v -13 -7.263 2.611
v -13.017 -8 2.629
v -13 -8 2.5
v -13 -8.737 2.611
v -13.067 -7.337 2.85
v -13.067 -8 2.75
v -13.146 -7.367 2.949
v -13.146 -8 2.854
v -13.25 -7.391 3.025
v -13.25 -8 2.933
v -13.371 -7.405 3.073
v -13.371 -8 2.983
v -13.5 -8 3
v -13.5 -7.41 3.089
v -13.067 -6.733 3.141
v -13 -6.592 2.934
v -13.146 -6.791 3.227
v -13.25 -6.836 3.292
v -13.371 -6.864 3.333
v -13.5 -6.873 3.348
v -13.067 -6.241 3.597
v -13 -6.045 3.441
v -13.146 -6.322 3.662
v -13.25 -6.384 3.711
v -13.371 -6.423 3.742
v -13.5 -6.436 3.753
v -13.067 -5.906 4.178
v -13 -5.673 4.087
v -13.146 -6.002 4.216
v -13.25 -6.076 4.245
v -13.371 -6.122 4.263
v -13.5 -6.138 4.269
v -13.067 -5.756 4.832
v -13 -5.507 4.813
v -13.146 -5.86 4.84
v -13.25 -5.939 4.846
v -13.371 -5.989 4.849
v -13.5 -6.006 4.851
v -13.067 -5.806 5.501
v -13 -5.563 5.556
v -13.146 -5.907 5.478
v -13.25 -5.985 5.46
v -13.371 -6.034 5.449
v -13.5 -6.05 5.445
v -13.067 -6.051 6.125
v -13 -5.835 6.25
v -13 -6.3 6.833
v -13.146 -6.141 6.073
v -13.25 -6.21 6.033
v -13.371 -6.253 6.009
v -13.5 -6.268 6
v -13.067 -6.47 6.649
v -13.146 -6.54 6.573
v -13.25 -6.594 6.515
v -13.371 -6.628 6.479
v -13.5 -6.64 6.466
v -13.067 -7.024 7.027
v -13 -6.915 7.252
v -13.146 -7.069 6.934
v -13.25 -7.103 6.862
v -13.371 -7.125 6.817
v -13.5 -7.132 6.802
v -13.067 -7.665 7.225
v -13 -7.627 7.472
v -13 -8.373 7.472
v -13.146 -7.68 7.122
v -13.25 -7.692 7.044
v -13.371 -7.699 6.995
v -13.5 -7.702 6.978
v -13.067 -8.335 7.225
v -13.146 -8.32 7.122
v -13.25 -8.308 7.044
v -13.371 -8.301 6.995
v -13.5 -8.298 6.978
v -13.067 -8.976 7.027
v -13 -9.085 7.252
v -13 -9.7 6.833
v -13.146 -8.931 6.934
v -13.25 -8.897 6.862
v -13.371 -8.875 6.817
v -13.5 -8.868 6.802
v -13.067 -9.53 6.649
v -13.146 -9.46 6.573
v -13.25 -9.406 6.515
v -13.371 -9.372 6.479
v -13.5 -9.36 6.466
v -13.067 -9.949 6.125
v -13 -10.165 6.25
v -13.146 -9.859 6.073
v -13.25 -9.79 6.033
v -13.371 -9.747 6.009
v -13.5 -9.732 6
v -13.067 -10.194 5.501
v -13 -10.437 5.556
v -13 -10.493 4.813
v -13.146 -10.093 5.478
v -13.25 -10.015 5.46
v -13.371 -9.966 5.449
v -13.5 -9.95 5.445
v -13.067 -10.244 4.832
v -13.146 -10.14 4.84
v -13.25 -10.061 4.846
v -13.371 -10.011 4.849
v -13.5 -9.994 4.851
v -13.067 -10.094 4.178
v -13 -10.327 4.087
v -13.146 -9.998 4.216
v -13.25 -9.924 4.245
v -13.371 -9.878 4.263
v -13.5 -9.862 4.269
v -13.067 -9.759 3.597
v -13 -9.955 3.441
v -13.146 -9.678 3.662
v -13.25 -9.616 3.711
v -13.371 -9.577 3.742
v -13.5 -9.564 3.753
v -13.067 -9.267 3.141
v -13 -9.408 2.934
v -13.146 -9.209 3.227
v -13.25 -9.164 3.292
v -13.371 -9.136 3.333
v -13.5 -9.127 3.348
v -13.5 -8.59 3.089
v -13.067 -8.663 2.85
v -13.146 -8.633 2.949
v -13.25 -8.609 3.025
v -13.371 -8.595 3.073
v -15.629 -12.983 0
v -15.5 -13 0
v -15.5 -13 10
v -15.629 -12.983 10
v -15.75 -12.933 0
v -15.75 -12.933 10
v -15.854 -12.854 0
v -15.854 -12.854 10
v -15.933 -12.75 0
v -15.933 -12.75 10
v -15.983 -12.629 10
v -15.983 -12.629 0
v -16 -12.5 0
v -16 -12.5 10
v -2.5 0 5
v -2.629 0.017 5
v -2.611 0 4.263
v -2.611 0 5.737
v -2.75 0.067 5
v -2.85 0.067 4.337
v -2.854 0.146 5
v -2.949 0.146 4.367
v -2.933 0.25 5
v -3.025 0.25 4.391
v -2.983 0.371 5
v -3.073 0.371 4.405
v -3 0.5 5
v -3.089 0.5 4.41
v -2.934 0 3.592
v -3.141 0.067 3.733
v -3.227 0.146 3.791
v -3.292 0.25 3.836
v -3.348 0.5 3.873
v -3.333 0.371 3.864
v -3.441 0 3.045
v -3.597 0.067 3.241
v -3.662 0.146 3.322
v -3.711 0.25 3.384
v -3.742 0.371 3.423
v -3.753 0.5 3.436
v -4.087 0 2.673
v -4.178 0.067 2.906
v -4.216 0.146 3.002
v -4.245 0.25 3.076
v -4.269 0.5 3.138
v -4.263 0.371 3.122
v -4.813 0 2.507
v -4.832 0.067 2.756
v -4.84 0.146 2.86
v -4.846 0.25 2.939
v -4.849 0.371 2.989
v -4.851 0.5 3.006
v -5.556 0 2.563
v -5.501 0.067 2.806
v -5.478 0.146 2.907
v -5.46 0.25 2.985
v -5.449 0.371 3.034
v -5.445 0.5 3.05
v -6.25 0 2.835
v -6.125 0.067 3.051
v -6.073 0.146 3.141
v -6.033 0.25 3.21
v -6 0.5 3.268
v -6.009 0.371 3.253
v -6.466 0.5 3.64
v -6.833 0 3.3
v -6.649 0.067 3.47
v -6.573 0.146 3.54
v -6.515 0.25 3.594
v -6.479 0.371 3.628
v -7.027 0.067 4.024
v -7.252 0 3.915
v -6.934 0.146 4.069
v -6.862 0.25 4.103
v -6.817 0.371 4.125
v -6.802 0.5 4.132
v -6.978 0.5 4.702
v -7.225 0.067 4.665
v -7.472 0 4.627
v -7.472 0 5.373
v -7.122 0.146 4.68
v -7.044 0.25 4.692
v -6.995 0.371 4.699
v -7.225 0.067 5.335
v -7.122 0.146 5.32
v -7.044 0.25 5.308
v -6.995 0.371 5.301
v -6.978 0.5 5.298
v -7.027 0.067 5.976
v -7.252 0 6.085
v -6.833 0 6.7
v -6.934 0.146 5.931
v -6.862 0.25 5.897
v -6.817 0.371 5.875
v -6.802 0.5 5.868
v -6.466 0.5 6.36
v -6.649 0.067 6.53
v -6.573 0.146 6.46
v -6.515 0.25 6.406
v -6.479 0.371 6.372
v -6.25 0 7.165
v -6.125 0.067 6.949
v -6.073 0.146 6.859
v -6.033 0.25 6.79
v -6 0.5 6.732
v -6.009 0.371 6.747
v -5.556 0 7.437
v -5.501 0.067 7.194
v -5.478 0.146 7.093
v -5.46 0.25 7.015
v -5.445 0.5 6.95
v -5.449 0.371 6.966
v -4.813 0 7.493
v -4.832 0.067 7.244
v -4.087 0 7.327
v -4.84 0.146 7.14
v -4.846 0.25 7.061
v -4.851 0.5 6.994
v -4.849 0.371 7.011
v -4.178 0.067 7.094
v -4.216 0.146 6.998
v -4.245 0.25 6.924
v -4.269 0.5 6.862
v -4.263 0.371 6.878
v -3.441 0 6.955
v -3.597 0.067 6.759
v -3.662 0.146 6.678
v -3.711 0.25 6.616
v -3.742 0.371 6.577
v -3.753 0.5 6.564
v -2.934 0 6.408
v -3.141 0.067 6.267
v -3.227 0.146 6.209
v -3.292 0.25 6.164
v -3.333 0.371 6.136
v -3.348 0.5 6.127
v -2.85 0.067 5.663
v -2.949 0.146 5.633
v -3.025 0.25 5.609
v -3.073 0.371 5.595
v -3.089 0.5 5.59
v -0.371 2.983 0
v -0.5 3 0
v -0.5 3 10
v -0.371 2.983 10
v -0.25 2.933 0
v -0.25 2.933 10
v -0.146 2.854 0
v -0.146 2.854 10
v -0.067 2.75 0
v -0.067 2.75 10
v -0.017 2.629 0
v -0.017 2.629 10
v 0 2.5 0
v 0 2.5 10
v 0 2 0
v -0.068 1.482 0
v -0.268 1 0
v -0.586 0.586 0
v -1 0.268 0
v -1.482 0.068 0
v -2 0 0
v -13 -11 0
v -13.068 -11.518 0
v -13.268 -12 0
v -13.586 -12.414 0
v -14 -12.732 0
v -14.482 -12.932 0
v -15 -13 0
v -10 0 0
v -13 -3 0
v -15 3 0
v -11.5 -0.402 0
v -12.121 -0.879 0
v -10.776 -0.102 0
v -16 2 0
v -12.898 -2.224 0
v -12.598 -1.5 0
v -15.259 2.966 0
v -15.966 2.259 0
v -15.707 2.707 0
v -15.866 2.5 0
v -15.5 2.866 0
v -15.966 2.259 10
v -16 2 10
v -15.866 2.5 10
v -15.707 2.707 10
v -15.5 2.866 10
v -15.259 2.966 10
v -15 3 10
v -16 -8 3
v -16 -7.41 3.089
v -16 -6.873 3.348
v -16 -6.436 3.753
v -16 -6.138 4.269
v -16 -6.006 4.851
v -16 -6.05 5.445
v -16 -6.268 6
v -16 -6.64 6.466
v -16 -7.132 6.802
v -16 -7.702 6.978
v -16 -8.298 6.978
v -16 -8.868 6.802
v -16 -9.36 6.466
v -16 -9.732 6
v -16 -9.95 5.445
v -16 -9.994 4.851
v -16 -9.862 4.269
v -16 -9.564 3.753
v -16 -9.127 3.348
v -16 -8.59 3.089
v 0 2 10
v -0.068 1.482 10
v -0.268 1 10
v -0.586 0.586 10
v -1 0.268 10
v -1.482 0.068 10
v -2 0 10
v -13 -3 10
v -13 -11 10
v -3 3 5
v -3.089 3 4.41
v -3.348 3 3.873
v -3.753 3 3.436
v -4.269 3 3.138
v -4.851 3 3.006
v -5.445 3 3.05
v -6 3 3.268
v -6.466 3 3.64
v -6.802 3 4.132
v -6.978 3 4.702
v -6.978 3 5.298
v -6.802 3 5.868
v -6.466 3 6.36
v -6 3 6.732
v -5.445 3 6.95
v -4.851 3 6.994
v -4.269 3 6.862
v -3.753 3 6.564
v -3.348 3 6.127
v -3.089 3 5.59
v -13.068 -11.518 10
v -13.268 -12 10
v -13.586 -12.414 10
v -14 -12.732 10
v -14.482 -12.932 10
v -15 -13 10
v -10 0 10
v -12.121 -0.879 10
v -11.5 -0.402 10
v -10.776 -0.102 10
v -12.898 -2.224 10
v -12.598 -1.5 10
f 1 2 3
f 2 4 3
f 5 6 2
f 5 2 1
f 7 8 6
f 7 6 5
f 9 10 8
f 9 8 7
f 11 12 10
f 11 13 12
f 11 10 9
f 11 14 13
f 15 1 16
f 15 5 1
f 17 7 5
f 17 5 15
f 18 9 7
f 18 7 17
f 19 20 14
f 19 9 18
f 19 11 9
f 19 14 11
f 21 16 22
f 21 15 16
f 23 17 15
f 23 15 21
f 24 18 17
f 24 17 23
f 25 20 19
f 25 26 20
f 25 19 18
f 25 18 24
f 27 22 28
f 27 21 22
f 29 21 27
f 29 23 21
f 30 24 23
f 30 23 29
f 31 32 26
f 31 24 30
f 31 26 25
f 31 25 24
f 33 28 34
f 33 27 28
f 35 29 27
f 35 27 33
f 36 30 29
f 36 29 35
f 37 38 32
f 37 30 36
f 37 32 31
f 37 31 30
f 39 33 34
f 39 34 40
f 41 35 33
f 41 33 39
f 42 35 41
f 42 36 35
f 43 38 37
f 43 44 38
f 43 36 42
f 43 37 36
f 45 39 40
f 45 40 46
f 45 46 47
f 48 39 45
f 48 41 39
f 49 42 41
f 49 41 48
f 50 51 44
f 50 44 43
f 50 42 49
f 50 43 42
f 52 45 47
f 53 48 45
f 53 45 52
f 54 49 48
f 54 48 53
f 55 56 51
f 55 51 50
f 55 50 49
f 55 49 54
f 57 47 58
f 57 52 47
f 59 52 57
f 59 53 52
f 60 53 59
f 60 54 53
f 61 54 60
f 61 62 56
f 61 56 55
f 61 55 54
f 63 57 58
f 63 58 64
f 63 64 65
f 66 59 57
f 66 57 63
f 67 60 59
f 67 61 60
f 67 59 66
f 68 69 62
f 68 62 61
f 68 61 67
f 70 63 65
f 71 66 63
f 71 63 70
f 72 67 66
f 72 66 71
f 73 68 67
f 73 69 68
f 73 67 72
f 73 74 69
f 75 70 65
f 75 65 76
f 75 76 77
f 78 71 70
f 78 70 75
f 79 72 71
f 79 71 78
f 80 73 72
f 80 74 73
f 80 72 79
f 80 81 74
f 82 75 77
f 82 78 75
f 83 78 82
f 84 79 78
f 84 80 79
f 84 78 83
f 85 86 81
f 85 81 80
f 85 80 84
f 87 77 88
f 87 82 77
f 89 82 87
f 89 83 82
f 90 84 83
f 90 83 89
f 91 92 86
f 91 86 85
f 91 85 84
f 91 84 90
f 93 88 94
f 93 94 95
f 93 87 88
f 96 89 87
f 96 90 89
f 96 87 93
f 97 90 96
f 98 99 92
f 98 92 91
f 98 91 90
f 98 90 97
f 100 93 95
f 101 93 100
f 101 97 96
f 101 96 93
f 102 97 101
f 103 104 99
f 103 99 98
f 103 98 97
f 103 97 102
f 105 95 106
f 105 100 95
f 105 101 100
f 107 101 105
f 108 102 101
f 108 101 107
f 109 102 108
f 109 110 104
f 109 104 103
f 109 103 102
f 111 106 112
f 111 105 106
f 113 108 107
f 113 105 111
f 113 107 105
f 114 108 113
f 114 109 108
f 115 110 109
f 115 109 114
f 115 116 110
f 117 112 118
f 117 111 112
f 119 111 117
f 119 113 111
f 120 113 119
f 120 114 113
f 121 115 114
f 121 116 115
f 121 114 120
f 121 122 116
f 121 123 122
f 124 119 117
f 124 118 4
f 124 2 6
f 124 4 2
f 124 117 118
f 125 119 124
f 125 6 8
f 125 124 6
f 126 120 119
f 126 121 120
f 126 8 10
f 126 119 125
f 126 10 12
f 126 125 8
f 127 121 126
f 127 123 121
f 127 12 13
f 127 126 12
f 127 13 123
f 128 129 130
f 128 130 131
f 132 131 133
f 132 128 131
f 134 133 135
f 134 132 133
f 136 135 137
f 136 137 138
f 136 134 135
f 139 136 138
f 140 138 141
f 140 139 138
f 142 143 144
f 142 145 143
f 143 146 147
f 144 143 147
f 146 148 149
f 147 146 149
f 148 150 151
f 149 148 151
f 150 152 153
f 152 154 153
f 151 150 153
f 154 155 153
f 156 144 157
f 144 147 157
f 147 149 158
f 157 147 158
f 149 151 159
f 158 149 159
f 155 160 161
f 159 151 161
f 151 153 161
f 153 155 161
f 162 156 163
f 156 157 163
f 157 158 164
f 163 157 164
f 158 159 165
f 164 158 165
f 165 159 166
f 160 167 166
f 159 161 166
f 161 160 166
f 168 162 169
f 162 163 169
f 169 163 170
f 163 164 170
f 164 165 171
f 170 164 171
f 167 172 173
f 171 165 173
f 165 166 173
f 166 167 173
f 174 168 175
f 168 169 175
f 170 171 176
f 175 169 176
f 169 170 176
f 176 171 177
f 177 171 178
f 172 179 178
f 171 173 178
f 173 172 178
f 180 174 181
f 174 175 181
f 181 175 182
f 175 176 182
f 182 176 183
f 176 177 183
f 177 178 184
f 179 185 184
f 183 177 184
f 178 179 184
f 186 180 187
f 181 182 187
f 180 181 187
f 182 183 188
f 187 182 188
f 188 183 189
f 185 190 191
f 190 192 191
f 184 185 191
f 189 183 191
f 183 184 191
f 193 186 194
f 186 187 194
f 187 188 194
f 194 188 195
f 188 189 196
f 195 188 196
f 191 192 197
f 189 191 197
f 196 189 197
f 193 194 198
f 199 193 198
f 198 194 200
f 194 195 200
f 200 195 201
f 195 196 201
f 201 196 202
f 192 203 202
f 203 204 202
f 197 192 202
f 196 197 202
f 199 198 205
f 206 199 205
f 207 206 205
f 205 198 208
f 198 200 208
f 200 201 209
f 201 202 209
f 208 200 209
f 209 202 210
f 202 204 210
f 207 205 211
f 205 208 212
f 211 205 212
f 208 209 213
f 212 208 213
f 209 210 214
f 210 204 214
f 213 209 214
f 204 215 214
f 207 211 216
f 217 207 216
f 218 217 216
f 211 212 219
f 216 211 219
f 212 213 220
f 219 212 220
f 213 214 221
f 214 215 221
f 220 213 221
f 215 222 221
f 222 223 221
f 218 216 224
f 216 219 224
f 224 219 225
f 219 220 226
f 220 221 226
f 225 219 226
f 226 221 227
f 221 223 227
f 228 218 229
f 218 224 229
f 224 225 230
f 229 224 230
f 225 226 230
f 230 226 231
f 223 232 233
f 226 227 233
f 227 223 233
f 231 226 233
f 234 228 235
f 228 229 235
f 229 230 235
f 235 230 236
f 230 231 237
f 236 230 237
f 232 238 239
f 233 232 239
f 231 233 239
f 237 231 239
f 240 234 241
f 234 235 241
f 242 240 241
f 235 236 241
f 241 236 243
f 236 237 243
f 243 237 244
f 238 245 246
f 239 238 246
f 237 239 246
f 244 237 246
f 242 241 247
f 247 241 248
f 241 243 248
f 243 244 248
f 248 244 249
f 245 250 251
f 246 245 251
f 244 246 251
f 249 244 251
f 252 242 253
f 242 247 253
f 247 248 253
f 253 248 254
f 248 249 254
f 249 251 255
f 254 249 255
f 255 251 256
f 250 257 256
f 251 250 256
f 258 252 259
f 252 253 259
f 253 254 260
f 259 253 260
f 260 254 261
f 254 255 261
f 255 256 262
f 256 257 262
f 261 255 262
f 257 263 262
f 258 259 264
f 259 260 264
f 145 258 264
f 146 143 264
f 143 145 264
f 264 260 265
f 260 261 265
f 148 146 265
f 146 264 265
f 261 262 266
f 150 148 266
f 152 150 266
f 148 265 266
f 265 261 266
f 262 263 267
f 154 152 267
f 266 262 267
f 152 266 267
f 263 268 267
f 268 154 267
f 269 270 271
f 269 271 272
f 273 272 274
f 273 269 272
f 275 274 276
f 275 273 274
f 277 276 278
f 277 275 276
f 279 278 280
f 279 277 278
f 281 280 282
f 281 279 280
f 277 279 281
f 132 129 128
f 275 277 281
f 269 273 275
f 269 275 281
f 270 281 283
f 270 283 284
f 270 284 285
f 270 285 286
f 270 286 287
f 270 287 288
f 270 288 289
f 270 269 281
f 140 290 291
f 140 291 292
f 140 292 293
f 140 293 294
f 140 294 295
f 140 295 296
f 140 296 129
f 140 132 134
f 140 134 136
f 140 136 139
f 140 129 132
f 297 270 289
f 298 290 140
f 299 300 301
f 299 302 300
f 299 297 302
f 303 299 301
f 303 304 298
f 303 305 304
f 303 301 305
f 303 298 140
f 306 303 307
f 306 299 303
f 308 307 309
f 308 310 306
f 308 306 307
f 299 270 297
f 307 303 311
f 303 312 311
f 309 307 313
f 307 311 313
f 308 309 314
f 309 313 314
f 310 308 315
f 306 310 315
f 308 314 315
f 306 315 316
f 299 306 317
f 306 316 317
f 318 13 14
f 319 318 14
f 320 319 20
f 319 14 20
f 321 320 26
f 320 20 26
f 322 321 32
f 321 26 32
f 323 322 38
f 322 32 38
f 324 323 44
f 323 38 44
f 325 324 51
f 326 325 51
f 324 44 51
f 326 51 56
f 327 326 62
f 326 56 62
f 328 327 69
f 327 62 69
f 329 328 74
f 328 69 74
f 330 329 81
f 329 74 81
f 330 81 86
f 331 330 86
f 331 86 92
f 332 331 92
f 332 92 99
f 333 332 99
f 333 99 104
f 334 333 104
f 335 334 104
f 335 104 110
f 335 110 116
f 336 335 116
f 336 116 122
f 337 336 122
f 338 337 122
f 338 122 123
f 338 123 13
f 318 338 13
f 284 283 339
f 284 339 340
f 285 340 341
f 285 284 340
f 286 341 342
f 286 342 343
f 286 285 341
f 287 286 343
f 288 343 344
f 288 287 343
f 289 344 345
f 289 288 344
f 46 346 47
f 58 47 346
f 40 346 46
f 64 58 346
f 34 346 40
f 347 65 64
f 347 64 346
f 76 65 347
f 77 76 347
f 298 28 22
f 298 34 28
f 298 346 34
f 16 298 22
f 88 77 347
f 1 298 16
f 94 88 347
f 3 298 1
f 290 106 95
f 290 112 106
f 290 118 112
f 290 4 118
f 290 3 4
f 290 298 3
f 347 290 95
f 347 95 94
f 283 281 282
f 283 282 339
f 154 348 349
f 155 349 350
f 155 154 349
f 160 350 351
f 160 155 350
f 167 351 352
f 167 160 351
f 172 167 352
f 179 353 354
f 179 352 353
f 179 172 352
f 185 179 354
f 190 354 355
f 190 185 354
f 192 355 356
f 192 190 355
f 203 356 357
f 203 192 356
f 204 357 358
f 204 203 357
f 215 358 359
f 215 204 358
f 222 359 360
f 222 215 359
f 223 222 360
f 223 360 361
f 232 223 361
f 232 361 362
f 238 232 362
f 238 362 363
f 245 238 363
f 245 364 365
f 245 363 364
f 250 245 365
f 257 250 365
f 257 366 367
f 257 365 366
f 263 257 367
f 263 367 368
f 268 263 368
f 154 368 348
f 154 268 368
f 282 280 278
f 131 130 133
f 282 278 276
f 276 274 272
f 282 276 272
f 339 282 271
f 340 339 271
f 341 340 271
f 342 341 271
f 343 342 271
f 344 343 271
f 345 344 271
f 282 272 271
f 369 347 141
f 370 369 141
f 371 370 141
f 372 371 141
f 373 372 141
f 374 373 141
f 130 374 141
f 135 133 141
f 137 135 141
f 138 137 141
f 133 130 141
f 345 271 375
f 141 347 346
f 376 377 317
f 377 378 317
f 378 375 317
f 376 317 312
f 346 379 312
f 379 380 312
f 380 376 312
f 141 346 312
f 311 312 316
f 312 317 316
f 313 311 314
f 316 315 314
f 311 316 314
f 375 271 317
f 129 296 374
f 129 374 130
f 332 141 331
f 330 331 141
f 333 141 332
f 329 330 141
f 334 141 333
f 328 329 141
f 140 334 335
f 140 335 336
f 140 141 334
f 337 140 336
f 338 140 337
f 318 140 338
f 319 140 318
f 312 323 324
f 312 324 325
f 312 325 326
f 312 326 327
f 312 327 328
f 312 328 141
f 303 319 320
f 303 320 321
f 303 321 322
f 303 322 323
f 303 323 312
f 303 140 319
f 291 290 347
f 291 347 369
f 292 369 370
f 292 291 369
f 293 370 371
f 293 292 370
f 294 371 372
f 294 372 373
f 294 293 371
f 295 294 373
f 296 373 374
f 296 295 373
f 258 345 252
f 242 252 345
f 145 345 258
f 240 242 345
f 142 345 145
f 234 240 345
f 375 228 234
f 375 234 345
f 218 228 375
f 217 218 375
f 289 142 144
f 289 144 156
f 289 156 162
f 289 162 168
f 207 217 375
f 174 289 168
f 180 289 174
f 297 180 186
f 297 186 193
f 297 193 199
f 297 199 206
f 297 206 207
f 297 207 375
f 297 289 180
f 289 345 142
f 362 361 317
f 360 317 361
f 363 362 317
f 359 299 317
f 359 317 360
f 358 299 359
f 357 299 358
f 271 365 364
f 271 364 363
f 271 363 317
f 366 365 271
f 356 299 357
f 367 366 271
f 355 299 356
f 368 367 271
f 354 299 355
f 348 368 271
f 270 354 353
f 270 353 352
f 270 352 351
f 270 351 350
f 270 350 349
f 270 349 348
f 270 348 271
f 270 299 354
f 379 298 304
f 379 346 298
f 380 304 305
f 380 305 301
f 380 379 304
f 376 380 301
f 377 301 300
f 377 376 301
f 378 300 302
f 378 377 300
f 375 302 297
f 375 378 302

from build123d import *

# Parameters (mm, degrees)
EXTRUDE_1_DEPTH     = 10
SKETCH_4_R          = 2
CUT_EXTRUDE_1_DEPTH = 10
SKETCH_2_R          = 2
CUT_EXTRUDE_2_DEPTH = 20
FILLET_2_R          = 0.5
FILLET_3_R          = 3
FILLET_4_R          = 1


with BuildPart() as part:
    # 草图1 → 凸台-拉伸1 (new body)
    with BuildSketch(Plane.XY):
        with BuildLine():
            Line((-13, 0), (-13, -11))
            ThreePointArc((-13, -11), (-13.585786438, -12.414213562), (-15, -13))
            Line((-15, -13), (-15.5, -13))
            ThreePointArc((-15.5, -13), (-15.853553391, -12.853553391), (-16, -12.5))
            Line((-16, -12.5), (-16, 3))
            Line((-16, 3), (-0.5, 3))
            ThreePointArc((-0.5, 3), (-0.146446609, 2.853553391), (0, 2.5))
            Line((0, 2.5), (0, 2))
            ThreePointArc((0, 2), (-0.585786438, 0.585786438), (-2, 0))
            Line((-2, 0), (-13, 0))
        make_face()
    extrude(amount=EXTRUDE_1_DEPTH)

    # 草图4 → 切除-拉伸1 (cut)
    with BuildSketch(Plane(origin=(0, 0, 0), x_dir=(1, 0, 0), z_dir=(0, 1, 0))):
        with Locations((-5, -5)):
            Circle(SKETCH_4_R)
    extrude(amount=CUT_EXTRUDE_1_DEPTH, mode=Mode.SUBTRACT)

    # 草图2 → 切除-拉伸2 (cut)
    with BuildSketch(Plane(origin=(-13, 0, 0), x_dir=(0, 0, -1), z_dir=(1, 0, 0))):
        with Locations((-5, -8)):
            Circle(SKETCH_2_R)
    extrude(amount=-CUT_EXTRUDE_2_DEPTH, mode=Mode.SUBTRACT)

    # 圆角2
    fillet_2_edges = [part.edges().sort_by_distance(p)[0] for p in [
        (-7, 0, 5),
        (-13, -8, 7),
    ]]
    fillet(fillet_2_edges, radius=FILLET_2_R)

    # 圆角3
    fillet_3_edges = [part.edges().sort_by_distance(p)[0] for p in [
        (-13, 0, 5),
    ]]
    fillet(fillet_3_edges, radius=FILLET_3_R)

    # 圆角4
    fillet_4_edges = [part.edges().sort_by_distance(p)[0] for p in [
        (-16, 3, 5),
    ]]
    fillet(fillet_4_edges, radius=FILLET_4_R)


solid = part.part
